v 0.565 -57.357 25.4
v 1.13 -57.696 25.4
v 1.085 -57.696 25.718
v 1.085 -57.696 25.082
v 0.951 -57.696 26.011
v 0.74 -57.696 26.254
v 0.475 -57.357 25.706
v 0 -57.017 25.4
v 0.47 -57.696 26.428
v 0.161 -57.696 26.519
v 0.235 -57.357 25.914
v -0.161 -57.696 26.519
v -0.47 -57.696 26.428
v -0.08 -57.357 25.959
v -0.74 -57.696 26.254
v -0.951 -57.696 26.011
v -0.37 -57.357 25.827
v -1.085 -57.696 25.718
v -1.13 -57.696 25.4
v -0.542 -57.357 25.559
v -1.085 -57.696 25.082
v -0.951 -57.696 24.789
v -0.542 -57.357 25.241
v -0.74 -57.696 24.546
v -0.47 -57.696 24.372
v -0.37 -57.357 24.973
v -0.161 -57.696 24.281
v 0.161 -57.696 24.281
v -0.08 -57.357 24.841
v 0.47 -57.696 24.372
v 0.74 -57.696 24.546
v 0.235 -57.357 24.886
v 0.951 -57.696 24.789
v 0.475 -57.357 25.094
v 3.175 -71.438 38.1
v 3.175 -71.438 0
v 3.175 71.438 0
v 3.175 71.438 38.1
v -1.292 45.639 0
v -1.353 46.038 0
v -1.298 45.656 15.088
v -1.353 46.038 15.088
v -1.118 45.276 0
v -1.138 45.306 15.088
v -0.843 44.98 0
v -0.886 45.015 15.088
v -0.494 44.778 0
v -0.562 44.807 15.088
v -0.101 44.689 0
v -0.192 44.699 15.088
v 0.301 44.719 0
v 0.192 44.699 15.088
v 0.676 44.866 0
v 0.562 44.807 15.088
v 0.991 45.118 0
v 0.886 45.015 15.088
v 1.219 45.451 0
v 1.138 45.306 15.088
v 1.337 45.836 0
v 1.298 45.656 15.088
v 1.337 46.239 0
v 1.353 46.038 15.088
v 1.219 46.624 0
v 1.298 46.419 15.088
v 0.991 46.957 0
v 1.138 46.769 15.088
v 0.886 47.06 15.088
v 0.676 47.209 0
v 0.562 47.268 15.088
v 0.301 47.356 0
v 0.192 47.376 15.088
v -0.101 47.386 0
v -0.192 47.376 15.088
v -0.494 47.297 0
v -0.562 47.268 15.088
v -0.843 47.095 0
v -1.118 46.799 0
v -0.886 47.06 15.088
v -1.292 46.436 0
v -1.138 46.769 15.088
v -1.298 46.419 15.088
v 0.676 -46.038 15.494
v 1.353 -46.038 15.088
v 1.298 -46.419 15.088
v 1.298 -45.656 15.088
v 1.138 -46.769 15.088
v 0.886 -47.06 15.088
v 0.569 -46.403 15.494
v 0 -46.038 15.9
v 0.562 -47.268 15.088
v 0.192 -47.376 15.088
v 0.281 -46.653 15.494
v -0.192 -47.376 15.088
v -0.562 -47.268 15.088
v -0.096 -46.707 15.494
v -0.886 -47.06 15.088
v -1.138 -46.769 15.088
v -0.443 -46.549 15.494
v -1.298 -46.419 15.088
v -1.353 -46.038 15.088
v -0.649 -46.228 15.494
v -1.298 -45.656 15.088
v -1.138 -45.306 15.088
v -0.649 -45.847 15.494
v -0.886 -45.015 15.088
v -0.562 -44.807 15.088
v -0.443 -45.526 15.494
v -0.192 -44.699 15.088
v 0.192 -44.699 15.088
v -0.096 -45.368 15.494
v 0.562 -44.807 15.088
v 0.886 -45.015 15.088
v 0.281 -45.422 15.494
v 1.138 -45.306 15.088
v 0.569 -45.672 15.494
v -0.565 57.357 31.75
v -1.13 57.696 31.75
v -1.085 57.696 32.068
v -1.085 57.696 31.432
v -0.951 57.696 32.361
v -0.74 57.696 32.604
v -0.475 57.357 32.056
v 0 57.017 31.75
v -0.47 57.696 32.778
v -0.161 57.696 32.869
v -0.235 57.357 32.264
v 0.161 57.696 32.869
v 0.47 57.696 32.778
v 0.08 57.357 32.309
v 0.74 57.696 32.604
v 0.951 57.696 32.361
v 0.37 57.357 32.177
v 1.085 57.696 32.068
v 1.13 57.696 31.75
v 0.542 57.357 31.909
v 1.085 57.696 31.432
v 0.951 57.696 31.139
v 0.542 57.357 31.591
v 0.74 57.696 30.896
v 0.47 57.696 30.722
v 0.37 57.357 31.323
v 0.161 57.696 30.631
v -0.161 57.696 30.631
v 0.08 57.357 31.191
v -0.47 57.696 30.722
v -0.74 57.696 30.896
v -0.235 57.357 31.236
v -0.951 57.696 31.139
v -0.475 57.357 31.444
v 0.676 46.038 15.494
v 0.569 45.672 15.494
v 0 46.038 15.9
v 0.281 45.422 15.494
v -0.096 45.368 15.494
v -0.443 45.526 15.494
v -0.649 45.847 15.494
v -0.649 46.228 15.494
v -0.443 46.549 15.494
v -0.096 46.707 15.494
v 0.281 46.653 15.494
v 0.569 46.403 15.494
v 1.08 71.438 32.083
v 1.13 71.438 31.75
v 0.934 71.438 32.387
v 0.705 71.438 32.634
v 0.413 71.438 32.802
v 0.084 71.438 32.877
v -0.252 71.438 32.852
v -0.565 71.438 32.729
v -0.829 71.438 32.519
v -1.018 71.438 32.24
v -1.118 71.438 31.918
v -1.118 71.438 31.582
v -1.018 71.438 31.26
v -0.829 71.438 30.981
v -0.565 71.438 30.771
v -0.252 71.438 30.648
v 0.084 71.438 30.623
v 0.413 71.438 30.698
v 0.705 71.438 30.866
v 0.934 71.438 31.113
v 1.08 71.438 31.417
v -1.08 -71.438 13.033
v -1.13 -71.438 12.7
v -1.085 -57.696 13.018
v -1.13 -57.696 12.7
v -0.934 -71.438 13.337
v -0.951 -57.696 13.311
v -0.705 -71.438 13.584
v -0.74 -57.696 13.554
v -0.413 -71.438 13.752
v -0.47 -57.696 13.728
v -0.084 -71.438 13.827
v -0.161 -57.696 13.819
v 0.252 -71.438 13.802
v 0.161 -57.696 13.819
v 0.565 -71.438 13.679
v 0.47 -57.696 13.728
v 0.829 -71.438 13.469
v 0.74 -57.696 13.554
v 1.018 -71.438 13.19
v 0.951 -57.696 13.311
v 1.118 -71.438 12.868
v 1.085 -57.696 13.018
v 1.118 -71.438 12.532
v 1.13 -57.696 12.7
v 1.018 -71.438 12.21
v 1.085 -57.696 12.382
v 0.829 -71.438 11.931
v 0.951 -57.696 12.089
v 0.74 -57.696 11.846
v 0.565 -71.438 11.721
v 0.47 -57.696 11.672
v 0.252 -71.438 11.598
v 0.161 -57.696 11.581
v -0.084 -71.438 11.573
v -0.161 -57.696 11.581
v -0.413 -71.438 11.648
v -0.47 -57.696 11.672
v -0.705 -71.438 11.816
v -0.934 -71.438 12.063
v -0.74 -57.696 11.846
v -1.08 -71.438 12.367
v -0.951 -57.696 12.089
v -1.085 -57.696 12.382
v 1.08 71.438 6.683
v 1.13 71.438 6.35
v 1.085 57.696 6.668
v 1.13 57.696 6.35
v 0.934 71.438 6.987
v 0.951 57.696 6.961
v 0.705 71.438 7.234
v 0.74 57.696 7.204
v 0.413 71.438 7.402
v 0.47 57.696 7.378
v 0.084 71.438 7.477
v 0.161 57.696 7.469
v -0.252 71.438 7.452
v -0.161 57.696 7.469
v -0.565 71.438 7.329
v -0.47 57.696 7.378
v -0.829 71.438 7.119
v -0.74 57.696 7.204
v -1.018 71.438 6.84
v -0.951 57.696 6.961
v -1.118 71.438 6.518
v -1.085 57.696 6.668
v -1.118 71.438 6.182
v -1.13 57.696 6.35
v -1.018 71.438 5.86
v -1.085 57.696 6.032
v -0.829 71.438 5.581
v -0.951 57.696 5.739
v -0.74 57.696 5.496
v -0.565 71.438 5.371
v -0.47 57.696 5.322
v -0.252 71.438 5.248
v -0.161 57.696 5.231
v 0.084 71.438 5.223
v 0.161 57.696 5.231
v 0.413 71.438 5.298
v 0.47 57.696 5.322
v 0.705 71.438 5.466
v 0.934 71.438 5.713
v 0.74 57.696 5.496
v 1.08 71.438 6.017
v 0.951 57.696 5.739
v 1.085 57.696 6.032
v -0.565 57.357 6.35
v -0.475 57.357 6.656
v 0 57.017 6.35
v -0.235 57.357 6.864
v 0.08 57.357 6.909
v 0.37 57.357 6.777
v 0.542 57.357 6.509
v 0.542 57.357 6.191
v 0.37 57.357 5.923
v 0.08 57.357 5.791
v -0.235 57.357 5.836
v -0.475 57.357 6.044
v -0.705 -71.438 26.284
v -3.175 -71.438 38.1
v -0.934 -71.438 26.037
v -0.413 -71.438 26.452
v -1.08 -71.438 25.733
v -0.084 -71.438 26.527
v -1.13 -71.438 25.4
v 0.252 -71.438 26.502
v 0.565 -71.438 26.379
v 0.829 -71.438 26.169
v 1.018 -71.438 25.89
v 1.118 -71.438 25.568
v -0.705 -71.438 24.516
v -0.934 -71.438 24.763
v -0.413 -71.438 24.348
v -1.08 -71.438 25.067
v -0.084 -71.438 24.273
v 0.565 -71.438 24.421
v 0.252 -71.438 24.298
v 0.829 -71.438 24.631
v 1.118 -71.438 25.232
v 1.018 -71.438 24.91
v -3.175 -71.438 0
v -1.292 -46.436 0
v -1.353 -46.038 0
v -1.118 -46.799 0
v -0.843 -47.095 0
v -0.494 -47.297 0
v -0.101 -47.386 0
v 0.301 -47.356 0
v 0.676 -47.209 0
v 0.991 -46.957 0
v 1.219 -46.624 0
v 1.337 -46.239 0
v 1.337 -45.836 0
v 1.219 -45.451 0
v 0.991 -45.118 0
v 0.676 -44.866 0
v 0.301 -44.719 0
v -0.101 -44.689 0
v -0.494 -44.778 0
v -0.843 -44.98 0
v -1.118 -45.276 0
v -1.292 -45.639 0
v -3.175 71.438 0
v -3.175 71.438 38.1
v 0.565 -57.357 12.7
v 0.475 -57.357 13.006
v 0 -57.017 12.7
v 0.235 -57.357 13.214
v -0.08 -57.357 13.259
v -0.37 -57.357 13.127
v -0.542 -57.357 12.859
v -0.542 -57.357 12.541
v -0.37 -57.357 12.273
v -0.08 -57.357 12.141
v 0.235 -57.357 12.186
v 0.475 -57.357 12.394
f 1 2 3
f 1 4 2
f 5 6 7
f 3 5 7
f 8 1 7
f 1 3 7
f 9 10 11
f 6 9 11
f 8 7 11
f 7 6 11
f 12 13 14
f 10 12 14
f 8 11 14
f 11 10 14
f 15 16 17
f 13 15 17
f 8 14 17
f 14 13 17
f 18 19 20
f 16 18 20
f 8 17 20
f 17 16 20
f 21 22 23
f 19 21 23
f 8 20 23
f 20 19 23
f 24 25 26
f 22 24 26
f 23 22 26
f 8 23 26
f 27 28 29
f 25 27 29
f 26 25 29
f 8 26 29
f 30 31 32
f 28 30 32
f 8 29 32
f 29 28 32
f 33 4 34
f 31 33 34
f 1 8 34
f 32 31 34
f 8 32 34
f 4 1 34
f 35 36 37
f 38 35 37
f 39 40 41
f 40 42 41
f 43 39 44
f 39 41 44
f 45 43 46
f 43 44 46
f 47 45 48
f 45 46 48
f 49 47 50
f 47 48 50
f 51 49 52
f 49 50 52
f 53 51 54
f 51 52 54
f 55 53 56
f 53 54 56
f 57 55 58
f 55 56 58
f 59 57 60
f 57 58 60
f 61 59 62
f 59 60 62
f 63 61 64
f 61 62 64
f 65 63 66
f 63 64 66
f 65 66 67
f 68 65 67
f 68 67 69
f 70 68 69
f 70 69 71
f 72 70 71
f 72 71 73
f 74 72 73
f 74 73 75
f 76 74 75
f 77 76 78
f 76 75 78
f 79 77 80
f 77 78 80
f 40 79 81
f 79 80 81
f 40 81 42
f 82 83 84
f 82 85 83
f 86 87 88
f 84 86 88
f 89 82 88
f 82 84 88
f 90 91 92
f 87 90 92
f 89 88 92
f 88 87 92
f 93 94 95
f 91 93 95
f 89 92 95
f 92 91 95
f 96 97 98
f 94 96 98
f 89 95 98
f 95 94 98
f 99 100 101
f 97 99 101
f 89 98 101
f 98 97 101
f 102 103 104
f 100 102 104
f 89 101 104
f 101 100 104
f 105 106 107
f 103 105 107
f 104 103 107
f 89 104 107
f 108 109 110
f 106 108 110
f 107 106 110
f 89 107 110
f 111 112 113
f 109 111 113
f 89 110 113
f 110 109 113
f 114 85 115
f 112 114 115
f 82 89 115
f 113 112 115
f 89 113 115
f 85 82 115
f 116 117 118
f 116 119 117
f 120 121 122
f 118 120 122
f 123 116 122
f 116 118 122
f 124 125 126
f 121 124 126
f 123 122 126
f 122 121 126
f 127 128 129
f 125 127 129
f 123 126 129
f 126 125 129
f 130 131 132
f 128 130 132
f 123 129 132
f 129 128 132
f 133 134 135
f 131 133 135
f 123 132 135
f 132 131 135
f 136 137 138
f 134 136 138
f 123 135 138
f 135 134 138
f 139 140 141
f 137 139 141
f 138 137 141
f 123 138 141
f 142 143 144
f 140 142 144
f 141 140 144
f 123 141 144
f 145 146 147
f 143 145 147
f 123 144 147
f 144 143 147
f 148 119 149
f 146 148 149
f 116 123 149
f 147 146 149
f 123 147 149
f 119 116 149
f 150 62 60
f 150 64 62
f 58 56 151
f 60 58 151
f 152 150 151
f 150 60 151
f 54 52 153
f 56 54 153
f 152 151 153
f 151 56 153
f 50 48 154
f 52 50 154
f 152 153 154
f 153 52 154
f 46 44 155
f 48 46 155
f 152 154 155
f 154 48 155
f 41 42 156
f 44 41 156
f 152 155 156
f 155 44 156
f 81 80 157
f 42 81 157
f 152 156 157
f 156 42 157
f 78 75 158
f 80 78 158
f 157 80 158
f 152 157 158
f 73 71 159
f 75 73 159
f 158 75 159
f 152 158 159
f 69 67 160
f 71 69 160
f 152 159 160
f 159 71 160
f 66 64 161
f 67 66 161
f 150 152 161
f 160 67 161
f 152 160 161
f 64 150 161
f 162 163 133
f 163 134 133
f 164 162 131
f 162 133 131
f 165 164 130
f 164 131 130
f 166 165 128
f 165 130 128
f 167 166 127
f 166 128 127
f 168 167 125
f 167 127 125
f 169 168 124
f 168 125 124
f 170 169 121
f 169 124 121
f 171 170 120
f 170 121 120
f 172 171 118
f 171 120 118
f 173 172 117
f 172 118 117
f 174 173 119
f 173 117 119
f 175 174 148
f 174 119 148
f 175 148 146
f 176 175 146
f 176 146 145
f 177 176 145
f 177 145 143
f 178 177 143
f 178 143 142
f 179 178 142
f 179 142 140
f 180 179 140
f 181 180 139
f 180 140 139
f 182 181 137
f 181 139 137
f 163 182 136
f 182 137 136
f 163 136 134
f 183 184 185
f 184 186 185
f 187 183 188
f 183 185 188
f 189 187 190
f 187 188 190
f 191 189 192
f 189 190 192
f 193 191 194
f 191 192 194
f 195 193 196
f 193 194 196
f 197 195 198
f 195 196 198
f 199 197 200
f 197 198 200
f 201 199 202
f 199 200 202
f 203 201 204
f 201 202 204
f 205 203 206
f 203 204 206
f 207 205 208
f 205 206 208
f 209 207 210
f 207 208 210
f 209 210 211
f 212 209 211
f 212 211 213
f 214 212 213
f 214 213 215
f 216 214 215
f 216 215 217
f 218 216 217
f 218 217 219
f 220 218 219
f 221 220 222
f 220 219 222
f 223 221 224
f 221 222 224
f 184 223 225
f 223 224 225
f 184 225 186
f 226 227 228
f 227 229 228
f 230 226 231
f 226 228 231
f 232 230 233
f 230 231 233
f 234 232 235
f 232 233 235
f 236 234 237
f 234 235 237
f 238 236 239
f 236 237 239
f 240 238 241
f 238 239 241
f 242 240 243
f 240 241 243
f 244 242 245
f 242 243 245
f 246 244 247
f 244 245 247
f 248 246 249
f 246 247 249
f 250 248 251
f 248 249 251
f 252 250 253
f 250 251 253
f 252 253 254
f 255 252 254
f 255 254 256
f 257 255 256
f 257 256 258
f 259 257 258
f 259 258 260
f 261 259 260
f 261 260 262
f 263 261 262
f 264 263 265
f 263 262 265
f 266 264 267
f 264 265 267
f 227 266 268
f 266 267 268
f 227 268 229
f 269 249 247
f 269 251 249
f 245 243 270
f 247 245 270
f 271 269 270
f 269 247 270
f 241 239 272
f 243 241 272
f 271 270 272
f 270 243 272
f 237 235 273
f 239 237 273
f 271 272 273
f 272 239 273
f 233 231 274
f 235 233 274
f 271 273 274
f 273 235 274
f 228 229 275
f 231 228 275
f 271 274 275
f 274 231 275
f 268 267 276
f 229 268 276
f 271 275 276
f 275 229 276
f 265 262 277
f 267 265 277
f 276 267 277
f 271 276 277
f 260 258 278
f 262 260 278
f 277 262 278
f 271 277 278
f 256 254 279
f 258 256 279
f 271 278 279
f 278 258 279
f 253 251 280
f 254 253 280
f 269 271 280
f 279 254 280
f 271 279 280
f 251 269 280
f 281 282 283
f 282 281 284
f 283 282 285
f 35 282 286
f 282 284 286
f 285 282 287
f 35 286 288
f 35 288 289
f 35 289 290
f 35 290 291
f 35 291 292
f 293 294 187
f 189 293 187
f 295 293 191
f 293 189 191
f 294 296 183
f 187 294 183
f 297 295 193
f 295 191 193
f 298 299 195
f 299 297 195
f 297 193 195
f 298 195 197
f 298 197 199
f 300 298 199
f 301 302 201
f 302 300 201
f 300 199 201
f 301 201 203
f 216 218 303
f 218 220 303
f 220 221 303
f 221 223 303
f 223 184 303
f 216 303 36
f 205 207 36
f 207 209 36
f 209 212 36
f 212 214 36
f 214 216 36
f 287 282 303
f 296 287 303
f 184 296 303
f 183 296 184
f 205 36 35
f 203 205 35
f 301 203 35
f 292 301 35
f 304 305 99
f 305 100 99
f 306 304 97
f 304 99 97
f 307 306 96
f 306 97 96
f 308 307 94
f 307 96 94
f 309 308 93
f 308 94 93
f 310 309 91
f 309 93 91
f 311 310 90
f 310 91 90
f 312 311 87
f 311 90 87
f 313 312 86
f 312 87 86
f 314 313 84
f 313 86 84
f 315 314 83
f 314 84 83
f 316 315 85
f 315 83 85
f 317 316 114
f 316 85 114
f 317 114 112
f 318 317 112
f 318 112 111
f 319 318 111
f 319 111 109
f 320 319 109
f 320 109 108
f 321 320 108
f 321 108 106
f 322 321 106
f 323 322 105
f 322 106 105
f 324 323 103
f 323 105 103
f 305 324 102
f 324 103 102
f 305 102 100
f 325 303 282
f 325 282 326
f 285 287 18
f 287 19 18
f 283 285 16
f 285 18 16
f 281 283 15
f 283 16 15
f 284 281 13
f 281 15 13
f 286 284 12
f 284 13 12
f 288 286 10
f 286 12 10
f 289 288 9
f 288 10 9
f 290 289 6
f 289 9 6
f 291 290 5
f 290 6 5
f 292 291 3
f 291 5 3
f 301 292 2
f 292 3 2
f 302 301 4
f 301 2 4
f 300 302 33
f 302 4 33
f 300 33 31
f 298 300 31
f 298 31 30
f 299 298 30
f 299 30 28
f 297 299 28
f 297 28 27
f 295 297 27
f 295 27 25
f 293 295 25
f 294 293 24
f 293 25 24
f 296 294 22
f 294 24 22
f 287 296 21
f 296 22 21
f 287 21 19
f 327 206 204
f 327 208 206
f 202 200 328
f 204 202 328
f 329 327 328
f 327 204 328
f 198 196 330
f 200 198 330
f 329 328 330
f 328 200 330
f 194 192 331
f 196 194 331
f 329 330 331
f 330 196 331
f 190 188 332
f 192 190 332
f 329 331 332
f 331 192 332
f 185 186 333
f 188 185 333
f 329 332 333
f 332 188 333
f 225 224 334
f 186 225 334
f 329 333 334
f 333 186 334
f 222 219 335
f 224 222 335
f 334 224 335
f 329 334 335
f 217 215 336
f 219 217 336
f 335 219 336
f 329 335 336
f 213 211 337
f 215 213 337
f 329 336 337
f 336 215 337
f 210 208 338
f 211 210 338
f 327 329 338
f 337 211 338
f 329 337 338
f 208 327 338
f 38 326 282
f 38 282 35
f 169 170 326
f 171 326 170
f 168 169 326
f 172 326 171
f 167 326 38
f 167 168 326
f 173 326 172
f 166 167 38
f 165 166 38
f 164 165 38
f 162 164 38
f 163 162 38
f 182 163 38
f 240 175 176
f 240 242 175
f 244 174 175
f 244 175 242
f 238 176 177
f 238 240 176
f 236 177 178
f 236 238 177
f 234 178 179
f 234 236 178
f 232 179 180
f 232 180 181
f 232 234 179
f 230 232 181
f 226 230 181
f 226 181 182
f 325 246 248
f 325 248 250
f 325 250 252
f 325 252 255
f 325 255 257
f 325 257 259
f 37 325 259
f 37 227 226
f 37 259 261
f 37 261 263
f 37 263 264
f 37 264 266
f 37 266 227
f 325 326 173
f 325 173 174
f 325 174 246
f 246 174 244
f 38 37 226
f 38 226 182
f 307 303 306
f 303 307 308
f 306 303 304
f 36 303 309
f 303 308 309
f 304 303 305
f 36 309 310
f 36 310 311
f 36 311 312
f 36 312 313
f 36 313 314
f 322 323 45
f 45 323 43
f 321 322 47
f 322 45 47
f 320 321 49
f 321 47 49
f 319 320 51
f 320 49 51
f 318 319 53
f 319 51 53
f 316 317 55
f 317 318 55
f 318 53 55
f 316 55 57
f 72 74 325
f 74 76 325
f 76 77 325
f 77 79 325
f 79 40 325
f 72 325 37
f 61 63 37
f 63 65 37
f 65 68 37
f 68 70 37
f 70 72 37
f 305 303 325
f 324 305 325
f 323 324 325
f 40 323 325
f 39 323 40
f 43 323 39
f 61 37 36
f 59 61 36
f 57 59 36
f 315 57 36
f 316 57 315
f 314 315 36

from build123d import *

# Parameters (mm, degrees)
F0_W           = 6.35
F0_H           = 142.875
F1_DEPTH       = 38.1
F3_D           = 2.7051
F3_DEPTH       = 15.0876
F3_TIP         = 0.8126940303
F6_D           = 2.2606
F6_DEPTH       = 13.7414
F6_TIP         = 0.6791527577
F6_ON_F4_D     = 2.2606
F6_ON_F4_DEPTH = 13.7414
F6_ON_F4_TIP   = 0.6791527577


with BuildPart() as f1:
    # F0 (on Top) → F1 (new body)
    with BuildSketch(Plane.XY):
        Rectangle(F0_W, F0_H)
    extrude(amount=F1_DEPTH)

    # F3
    with Locations(Plane(origin=(0, 0, 0), x_dir=(1, 0, 0), z_dir=(0, 0, -1))):
        with Locations((0, 46.0375), (0, -46.0375)):
            Hole(F3_D / 2, depth=F3_DEPTH)
            with Locations((0, 0, -(F3_DEPTH + F3_TIP / 2))):  # 118° drill point
                Cone(0, F3_D / 2, F3_TIP, mode=Mode.SUBTRACT)

    # F6
    with Locations(Plane.XZ.offset(71.4375)):
        with Locations((0, 25.4), (0, 12.7)):
            Hole(F6_D / 2, depth=F6_DEPTH)
            with Locations((0, 0, -(F6_DEPTH + F6_TIP / 2))):  # 118° drill point
                Cone(0, F6_D / 2, F6_TIP, mode=Mode.SUBTRACT)

    # F6 on F4
    with Locations(Plane(origin=(0, 71.4375, 0), x_dir=(-1, 0, 0), z_dir=(0, 1, 0))):
        with Locations((0, 31.75), (0, 6.35)):
            Hole(F6_ON_F4_D / 2, depth=F6_ON_F4_DEPTH)
            with Locations((0, 0, -(F6_ON_F4_DEPTH + F6_ON_F4_TIP / 2))):  # 118° drill point
                Cone(0, F6_ON_F4_D / 2, F6_ON_F4_TIP, mode=Mode.SUBTRACT)


solid = f1.part
